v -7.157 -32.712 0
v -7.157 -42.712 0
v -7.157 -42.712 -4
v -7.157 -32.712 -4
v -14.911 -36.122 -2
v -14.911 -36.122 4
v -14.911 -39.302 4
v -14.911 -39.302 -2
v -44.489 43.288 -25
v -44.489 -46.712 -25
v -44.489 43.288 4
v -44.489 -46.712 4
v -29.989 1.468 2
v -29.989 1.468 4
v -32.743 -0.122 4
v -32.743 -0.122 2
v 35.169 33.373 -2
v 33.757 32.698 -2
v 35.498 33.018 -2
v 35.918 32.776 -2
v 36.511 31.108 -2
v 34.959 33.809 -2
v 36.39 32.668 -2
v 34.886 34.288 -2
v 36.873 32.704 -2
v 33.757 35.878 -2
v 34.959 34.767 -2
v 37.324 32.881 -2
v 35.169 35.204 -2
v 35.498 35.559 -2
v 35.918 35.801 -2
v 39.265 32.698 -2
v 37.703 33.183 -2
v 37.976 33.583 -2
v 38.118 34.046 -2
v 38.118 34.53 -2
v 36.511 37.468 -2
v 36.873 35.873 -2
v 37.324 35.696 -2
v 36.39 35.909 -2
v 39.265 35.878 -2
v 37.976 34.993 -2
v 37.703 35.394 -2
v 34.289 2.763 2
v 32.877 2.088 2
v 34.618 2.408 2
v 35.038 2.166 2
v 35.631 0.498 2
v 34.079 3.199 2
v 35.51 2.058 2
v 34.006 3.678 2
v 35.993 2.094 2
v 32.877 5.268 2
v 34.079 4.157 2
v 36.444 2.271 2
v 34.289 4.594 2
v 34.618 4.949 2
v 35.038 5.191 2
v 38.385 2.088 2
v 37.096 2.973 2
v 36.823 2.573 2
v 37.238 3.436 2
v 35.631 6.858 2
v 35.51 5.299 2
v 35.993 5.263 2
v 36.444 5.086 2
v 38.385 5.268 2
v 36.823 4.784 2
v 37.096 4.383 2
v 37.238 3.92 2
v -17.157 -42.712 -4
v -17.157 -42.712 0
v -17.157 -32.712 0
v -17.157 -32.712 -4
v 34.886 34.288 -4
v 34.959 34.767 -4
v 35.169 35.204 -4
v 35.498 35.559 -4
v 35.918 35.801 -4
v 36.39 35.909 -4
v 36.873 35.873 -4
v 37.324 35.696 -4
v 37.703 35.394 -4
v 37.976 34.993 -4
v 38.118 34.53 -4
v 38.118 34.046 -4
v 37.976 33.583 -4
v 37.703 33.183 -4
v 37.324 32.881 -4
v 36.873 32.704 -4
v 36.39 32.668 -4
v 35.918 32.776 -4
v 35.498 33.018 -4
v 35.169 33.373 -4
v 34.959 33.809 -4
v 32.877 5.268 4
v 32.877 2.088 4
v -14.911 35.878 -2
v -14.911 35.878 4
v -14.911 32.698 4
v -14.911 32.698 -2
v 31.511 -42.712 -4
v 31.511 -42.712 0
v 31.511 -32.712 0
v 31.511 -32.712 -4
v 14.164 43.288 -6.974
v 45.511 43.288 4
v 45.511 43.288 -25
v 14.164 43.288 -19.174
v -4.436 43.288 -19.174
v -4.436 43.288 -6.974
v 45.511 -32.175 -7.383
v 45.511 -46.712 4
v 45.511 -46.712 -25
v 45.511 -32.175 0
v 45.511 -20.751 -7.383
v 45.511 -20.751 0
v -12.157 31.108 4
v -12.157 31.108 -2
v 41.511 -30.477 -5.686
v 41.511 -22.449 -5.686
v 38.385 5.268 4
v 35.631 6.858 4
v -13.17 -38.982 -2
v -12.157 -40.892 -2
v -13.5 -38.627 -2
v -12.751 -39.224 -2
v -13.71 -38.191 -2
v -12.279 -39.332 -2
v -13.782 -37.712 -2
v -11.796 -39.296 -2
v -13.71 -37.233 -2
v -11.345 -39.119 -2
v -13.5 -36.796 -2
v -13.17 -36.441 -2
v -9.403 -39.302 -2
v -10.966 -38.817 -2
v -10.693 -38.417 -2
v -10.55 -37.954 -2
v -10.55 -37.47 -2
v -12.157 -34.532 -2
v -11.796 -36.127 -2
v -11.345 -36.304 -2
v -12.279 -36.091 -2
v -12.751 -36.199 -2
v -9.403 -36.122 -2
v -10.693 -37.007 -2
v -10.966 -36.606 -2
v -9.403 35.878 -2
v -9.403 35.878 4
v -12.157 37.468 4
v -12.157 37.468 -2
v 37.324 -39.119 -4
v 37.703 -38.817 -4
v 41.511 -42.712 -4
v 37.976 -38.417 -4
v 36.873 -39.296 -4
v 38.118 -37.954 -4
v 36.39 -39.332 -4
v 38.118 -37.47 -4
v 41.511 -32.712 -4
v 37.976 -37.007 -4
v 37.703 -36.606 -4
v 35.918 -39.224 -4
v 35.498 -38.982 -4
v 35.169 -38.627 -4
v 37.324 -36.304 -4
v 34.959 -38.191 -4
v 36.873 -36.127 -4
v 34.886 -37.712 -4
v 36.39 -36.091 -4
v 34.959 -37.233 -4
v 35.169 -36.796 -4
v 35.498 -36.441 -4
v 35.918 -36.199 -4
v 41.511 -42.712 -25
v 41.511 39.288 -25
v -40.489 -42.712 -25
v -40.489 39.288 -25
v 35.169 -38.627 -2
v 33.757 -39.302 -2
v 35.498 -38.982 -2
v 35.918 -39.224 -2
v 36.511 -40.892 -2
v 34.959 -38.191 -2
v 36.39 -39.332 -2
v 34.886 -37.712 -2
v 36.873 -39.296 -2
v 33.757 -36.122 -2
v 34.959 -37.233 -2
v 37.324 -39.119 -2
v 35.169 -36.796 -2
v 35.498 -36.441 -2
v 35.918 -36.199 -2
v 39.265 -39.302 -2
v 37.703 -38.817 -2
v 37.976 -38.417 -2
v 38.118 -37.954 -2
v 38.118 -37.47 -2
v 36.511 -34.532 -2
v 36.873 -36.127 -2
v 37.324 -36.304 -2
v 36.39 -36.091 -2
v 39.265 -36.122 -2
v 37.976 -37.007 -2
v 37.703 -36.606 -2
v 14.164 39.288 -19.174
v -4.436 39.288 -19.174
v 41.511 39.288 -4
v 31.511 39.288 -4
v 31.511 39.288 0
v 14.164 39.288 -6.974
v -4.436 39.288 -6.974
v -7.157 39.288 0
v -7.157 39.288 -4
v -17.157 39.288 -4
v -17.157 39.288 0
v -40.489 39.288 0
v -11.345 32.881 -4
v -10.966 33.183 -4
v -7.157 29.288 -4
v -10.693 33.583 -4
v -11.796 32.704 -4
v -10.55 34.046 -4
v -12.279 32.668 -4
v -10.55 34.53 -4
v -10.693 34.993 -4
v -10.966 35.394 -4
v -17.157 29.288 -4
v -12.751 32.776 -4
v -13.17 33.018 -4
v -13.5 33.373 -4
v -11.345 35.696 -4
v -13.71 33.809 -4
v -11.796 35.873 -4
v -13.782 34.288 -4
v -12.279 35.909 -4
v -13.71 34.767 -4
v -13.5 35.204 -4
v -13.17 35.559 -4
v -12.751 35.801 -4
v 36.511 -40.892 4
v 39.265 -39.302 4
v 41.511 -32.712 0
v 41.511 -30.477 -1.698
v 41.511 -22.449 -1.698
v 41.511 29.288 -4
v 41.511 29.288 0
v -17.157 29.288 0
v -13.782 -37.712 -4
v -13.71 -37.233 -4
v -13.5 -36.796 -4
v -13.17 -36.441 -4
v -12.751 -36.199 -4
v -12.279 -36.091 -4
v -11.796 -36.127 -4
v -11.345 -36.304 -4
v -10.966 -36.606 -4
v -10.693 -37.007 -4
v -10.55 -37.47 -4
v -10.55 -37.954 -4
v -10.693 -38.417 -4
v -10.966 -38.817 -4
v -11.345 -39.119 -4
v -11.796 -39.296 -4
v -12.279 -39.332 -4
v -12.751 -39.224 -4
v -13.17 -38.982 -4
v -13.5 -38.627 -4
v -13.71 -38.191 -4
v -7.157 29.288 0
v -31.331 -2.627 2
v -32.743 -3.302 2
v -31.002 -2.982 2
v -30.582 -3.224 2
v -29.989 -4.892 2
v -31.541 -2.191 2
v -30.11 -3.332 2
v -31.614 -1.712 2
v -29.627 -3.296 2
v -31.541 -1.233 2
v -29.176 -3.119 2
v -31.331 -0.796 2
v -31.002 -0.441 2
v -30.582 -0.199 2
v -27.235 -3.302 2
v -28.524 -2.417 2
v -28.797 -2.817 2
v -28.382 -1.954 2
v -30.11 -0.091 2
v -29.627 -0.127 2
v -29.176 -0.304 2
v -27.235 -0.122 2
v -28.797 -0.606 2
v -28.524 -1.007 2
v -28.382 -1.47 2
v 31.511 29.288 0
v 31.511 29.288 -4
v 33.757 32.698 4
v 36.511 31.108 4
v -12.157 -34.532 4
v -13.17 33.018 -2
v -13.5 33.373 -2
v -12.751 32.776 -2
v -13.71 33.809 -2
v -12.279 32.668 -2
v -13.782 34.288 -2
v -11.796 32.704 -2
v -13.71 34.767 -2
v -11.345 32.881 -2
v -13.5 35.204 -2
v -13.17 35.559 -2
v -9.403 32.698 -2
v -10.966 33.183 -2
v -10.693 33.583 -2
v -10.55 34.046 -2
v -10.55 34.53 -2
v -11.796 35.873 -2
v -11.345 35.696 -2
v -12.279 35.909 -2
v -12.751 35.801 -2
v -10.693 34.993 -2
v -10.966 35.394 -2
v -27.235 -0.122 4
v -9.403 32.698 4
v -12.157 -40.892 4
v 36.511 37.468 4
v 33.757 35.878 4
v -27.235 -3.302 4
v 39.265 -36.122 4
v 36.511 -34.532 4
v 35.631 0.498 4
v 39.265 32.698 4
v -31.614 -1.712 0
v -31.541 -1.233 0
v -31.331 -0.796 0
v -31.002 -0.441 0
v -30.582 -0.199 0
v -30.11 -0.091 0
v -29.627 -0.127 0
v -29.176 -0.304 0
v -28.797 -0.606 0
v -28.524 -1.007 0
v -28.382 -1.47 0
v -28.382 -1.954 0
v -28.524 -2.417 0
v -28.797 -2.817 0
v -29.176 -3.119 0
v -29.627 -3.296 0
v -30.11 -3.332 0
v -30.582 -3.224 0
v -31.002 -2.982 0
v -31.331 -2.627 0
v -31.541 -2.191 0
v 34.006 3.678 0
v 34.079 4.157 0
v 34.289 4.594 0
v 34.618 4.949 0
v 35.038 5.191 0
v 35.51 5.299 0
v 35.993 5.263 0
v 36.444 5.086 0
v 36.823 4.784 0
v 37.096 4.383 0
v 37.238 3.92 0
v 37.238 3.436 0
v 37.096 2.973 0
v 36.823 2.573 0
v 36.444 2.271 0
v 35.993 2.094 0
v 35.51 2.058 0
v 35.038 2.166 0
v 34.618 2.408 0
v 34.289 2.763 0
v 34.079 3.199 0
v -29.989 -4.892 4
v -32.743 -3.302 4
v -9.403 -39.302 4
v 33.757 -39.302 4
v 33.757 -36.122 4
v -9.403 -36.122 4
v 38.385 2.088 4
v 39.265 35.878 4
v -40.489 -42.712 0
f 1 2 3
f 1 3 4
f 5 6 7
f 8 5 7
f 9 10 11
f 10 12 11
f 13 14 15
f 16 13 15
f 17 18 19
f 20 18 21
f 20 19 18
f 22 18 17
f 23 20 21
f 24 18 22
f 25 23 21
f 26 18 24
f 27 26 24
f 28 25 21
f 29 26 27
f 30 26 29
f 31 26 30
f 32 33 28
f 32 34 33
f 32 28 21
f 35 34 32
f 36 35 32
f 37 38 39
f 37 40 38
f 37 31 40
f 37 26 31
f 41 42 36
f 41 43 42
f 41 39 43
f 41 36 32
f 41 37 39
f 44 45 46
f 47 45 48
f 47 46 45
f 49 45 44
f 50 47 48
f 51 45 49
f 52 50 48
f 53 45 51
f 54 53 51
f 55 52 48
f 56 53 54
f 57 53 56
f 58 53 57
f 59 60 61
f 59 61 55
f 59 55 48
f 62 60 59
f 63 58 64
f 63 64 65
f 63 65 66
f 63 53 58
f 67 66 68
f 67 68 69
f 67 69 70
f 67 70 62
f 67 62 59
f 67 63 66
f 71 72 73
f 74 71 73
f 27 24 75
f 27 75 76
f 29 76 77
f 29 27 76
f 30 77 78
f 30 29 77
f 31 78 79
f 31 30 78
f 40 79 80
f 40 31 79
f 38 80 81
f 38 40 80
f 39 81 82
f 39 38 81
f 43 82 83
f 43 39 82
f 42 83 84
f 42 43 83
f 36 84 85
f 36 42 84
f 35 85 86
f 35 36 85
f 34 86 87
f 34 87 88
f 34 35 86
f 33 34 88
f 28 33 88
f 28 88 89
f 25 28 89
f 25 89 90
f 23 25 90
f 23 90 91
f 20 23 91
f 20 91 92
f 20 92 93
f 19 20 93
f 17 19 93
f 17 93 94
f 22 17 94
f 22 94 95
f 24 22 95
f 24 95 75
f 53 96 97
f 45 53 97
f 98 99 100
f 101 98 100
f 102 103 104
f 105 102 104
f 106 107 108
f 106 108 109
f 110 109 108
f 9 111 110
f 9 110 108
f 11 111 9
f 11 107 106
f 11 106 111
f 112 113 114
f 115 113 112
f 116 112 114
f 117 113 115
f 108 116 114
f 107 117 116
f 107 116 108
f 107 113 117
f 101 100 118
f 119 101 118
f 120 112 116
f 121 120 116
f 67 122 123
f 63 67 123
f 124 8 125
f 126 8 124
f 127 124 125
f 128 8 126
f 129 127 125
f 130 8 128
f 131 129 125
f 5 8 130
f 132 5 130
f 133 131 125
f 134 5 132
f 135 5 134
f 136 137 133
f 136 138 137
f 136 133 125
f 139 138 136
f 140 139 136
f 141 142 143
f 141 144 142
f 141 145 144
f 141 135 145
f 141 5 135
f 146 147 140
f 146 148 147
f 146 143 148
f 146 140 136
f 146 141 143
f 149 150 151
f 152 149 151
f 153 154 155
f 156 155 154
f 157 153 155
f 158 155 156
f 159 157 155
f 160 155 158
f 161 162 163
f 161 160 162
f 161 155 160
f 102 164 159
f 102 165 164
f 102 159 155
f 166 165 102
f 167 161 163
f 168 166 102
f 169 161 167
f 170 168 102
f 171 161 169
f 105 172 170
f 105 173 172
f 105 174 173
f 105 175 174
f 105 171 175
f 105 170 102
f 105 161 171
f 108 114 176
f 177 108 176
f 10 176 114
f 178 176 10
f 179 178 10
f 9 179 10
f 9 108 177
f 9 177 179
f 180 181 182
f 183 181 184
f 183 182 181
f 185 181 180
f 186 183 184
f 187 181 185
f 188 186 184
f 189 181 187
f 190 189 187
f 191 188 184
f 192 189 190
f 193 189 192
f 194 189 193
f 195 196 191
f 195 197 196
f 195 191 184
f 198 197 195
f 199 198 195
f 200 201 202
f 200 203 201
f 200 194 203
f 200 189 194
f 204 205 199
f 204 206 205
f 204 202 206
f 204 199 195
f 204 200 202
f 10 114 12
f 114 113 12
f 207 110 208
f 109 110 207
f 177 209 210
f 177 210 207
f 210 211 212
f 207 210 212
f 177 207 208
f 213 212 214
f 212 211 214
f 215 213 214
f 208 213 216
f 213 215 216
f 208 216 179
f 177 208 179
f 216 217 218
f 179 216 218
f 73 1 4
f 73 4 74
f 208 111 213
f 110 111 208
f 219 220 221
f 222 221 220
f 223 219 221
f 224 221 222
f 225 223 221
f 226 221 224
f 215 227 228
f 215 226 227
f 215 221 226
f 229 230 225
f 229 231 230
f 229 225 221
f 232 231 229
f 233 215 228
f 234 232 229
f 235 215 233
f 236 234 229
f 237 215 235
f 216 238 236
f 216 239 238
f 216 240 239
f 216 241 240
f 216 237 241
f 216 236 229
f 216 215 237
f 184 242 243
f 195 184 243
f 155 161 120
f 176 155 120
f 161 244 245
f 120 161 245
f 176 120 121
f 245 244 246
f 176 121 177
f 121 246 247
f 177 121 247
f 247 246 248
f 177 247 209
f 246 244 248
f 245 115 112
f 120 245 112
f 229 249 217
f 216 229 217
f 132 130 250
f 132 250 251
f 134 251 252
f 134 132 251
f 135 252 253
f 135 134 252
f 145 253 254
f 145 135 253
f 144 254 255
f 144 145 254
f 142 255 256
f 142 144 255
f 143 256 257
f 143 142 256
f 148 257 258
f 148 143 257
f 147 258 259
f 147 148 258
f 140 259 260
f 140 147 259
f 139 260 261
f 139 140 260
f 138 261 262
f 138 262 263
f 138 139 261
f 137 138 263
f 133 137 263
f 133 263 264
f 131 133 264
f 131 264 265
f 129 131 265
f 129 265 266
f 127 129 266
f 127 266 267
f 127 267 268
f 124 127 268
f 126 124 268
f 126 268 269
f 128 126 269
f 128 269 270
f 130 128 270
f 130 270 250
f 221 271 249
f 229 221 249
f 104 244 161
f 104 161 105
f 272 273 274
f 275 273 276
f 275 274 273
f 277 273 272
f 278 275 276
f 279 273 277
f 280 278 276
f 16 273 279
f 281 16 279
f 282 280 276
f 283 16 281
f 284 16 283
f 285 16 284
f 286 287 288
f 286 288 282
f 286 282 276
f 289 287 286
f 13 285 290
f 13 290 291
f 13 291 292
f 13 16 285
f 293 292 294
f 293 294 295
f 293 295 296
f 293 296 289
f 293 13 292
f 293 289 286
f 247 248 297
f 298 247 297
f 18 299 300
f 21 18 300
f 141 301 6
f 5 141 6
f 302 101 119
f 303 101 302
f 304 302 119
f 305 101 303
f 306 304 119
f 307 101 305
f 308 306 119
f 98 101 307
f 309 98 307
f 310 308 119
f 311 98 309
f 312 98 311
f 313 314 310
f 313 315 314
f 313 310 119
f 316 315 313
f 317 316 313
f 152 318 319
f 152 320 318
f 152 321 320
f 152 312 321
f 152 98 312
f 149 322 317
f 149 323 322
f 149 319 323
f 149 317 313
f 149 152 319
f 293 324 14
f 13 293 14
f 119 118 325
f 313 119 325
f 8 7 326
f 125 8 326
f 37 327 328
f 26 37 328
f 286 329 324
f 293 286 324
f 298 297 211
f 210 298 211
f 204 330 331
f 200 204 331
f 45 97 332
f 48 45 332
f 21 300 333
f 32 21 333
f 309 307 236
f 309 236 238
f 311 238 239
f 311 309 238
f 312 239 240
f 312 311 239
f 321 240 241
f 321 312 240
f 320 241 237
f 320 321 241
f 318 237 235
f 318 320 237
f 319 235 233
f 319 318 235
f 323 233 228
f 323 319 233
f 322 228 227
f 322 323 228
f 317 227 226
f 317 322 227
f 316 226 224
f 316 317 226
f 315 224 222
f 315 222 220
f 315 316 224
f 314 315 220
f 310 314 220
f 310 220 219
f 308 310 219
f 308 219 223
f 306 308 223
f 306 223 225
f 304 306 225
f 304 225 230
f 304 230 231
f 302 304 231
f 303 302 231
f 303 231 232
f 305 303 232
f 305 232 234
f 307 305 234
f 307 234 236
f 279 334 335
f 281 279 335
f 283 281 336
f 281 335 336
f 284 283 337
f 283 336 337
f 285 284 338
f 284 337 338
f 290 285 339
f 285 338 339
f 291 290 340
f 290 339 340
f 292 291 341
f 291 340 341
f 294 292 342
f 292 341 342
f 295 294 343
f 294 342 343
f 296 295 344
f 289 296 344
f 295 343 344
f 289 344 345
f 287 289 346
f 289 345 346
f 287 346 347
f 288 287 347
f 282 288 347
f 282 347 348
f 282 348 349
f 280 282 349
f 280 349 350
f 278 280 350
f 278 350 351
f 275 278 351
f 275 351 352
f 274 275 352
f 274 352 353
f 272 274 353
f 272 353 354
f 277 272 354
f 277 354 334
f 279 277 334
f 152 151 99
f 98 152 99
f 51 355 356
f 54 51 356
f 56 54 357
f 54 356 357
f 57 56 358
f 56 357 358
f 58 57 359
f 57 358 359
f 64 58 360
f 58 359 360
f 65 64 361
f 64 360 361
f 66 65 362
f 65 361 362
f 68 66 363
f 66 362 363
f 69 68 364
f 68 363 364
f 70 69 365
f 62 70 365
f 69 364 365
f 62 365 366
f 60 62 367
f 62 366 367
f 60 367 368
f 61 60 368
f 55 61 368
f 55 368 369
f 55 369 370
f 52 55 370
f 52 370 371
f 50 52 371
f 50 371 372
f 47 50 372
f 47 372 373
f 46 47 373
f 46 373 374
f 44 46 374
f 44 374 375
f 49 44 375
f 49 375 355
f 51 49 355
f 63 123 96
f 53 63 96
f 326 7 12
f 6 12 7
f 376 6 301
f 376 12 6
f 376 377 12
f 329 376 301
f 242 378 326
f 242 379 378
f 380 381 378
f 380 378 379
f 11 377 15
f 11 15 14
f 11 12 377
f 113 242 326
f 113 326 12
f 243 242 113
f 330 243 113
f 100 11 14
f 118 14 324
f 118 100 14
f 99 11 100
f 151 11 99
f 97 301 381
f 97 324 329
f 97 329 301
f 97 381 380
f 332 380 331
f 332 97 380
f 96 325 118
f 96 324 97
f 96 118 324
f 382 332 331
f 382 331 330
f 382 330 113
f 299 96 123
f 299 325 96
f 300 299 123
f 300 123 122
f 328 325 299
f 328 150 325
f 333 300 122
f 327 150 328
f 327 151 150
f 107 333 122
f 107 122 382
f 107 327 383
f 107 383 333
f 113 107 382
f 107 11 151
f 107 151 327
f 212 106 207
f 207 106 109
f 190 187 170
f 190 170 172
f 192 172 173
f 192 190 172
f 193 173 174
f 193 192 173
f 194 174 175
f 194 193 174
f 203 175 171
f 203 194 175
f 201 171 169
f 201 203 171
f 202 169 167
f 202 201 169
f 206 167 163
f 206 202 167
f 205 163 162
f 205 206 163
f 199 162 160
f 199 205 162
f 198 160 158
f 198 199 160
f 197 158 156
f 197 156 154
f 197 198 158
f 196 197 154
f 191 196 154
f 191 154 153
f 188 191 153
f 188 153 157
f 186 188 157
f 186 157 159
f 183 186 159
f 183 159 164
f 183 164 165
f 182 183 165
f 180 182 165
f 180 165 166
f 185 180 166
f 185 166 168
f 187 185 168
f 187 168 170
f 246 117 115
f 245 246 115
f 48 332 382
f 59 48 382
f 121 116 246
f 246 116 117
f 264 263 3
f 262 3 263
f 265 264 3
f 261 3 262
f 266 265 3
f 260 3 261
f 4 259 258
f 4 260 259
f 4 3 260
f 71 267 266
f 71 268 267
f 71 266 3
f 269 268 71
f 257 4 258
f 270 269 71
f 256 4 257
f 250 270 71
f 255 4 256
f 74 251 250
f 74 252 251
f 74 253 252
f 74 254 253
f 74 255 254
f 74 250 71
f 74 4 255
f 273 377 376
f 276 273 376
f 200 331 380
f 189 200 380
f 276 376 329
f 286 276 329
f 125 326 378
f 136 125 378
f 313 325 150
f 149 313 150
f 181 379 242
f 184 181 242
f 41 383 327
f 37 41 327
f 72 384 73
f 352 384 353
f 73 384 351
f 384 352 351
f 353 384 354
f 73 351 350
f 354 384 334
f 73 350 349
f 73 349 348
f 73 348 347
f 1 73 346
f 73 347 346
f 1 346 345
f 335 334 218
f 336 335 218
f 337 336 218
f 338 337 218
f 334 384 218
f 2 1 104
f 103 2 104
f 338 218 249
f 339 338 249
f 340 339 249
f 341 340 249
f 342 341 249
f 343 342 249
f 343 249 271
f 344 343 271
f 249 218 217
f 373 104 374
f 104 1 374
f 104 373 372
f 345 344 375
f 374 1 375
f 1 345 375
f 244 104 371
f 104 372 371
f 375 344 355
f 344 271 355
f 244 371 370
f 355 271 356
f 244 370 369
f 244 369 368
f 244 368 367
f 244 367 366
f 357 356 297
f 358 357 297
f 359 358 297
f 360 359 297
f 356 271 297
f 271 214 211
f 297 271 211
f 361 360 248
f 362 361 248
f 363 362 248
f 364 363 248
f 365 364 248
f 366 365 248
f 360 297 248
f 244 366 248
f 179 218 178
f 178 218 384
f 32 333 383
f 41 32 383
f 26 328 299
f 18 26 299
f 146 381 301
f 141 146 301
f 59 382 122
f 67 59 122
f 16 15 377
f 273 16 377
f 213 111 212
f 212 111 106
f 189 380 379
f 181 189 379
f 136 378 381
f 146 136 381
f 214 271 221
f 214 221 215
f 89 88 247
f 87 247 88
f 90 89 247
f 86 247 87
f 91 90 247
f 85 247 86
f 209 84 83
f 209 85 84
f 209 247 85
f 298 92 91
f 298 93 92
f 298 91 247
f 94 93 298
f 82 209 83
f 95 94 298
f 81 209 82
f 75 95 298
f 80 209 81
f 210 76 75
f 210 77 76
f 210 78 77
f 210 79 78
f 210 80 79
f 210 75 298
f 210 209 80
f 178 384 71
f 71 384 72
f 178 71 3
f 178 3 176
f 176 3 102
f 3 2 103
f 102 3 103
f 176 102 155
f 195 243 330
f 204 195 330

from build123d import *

# Parameters (mm, degrees)
CROQUIS1_W              = 90
CROQUIS1_H              = 90
SALIENTE_EXTRUIR1_DEPTH = 4
CROQUIS2_W              = 90
CROQUIS2_H              = 90
SALIENTE_EXTRUIR2_DEPTH = 25
CORTAR_EXTRUIR1_DEPTH   = 4
CORTAR_EXTRUIR1_DRAFT   = -23
CROQUIS6_W              = 10
CROQUIS6_H              = 10
SALIENTE_EXTRUIR4_DEPTH = 4
CORTAR_EXTRUIR2_START   = -8
CROQUIS7_R              = 1.625
CORTAR_EXTRUIR2_DEPTH   = 8
CORTAR_EXTRUIR3_DEPTH   = 6
CROQUIS9_R              = 1.625
CORTAR_EXTRUIR4_DEPTH   = 4
CORTAR_EXTRUIR5_DEPTH   = 2
CORTAR_EXTRUIR6_DEPTH   = 6
CROQUIS14_W             = 18.6
CROQUIS14_H             = 12.2
CORTAR_EXTRUIR7_DEPTH   = 4


with BuildPart() as part:
    # Croquis1 → Saliente-Extruir1 (new body)
    with BuildSketch(Plane.XY):
        with Locations((0.511455403, -1.711718513)):
            Rectangle(CROQUIS1_W, CROQUIS1_H)
    extrude(amount=SALIENTE_EXTRUIR1_DEPTH)

    # Croquis2 → Saliente-Extruir2 (add)
    with BuildSketch(Plane(origin=(0, 0, 0), x_dir=(-1, 0, 0), z_dir=(0, 0, -1))):
        with Locations((-0.511455403, -1.711718513)):
            Rectangle(CROQUIS2_W, CROQUIS2_H)
        Polygon((40.488544597, -27.157447779), (40.488544597, -42.711718513), (-41.511455403, -42.711718513), (-41.511455403, 39.288281487), (40.488544597, 39.288281487), align=None, mode=Mode.SUBTRACT)
    extrude(amount=SALIENTE_EXTRUIR2_DEPTH)


with BuildPart() as cortar_extruir1_tool:
    # Croquis4 → Cortar-Extruir1 (with draft: the straight prism first)
    with BuildSketch(Plane(origin=(45.511455403, 0, 0), x_dir=(0, 0, -1), z_dir=(1, 0, 0))):
        Polygon((0, -21.474747311), (0, -31.451823221), (0, -32.175243971), (7.383420942, -32.175243971), (7.383420942, -31.451823221), (7.383420942, -21.474747311), (7.383420942, -20.751326561), (0, -20.751326561), align=None)
    extrude(amount=-CORTAR_EXTRUIR1_DEPTH)
    # Cortar-Extruir1: the draft: its side faces are tilted about the plane it starts from
    cortar_extruir1_sides = [cortar_extruir1_tool.faces().sort_by_distance(p)[0] for p in [
        (43.511455403, -26.463285266, 0),
        (43.511455403, -26.463285266, -7.383420942),
        (43.511455403, -32.175243971, -3.691710471),
        (43.511455403, -20.751326561, -3.691710471),
    ]]
    draft(cortar_extruir1_sides, Plane(origin=(45.511455403, 0, 0), x_dir=(0, 0, -1), z_dir=(1, 0, 0)), CORTAR_EXTRUIR1_DRAFT)


with BuildPart() as part_1:
    add(part.part)

    # Cortar-Extruir1: cut by cortar_extruir1_tool
    add(cortar_extruir1_tool.part, mode=Mode.SUBTRACT)

    # Croquis6 → Saliente-Extruir4 (add)
    with BuildSketch(Plane(origin=(0, 0, 0), x_dir=(-1, 0, 0), z_dir=(0, 0, -1))):
        with Locations((-36.511455403, 34.288281487)):
            Rectangle(CROQUIS6_W, CROQUIS6_H)
        with Locations((-36.511455403, -37.711718513)):
            Rectangle(CROQUIS6_W, CROQUIS6_H)
        with Locations((12.157098337, -37.711718513)):
            Rectangle(CROQUIS6_W, CROQUIS6_H)
        with Locations((12.157098337, 34.288281487)):
            Rectangle(CROQUIS6_W, CROQUIS6_H)
    extrude(amount=SALIENTE_EXTRUIR4_DEPTH)

    # Croquis7 → Cortar-Extruir2 (cut)
    with BuildSketch(Plane(origin=(0, 0, -4), x_dir=(-1, 0, 0), z_dir=(0, 0, -1)).offset(CORTAR_EXTRUIR2_START)):
        with Locations((-36.511455403, 34.288281487)):
            Circle(CROQUIS7_R)
        with Locations((-36.511455403, -37.711718513)):
            Circle(CROQUIS7_R)
        with Locations((12.157098337, -37.711718513)):
            Circle(CROQUIS7_R)
        with Locations((12.157098337, 34.288281487)):
            Circle(CROQUIS7_R)
    extrude(amount=CORTAR_EXTRUIR2_DEPTH, mode=Mode.SUBTRACT)

    # Croquis8 → Cortar-Extruir3 (cut)
    with BuildSketch(Plane.XY.offset(4)):
        Polygon((36.511455403, -40.891718513), (39.265416187, -39.301718513), (39.265416187, -36.121718513), (36.511455403, -34.531718513), (33.757494619, -36.121718513), (33.757494619, -39.301718513), align=None)
        Polygon((36.511455403, 31.108281487), (39.265416187, 32.698281487), (39.265416187, 35.878281487), (36.511455403, 37.468281487), (33.757494619, 35.878281487), (33.757494619, 32.698281487), align=None)
    extrude(amount=-CORTAR_EXTRUIR3_DEPTH, mode=Mode.SUBTRACT)

    # Croquis9 → Cortar-Extruir4 (cut)
    with BuildSketch(Plane(origin=(0, 0, 0), x_dir=(-1, 0, 0), z_dir=(0, 0, -1))):
        with Locations((-35.631455403, 3.678281487)):
            Circle(CROQUIS9_R)
        with Locations((29.988544597, -1.711718513)):
            Circle(CROQUIS9_R)
    extrude(amount=-CORTAR_EXTRUIR4_DEPTH, mode=Mode.SUBTRACT)

    # Croquis10 → Cortar-Extruir5 (cut)
    with BuildSketch(Plane.XY.offset(4)):
        Polygon((-29.988544597, -4.891718513), (-27.234583813, -3.301718513), (-27.234583813, -0.121718513), (-29.988544597, 1.468281487), (-32.742505381, -0.121718513), (-32.742505381, -3.301718513), align=None)
        Polygon((35.631455403, 0.498281487), (38.385416187, 2.088281487), (38.385416187, 5.268281487), (35.631455403, 6.858281487), (32.877494619, 5.268281487), (32.877494619, 2.088281487), align=None)
    extrude(amount=-CORTAR_EXTRUIR5_DEPTH, mode=Mode.SUBTRACT)

    # Croquis11 → Cortar-Extruir6 (cut)
    with BuildSketch(Plane.XY.offset(4)):
        Polygon((-12.157098337, 31.108281487), (-9.403137553, 32.698281487), (-9.403137553, 35.878281487), (-12.157098337, 37.468281487), (-14.911059122, 35.878281487), (-14.911059122, 32.698281487), align=None)
        Polygon((-12.157098337, -34.531718513), (-14.911059122, -36.121718513), (-14.911059122, -39.301718513), (-12.157098337, -40.891718513), (-9.403137553, -39.301718513), (-9.403137553, -36.121718513), align=None)
    extrude(amount=-CORTAR_EXTRUIR6_DEPTH, mode=Mode.SUBTRACT)

    # Croquis14 → Cortar-Extruir7 (cut)
    with BuildSketch(Plane(origin=(0, 43.288281487, 0), x_dir=(1, 0, 0), z_dir=(0, 1, 0))):
        with Locations((4.864130661, 13.073723415)):
            Rectangle(CROQUIS14_W, CROQUIS14_H)
    extrude(amount=-CORTAR_EXTRUIR7_DEPTH, mode=Mode.SUBTRACT)


solid = part_1.part
